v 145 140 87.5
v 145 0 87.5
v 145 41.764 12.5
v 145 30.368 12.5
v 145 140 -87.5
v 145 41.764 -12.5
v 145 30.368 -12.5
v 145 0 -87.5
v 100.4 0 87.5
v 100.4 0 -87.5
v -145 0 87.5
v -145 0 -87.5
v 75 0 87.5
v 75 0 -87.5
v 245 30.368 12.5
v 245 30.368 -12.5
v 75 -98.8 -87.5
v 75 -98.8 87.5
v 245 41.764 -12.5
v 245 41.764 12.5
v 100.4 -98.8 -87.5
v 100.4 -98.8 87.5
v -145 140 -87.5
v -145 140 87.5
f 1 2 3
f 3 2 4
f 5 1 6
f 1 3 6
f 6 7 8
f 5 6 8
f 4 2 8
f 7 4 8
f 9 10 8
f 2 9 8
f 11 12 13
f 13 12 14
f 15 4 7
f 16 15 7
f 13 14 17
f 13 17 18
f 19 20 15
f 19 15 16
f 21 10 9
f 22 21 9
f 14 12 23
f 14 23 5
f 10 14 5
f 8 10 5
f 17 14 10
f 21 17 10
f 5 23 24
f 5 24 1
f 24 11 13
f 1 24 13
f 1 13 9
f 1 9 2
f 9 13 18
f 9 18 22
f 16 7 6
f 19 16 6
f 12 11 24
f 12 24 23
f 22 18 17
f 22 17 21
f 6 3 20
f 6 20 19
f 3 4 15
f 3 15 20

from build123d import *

# Parameters (mm, degrees)
SKETCH1_W           = 290
SKETCH1_H           = 175
BOSS_EXTRUDE1_DEPTH = 140
SKETCH2_W           = 25.4
SKETCH2_H           = 175
BOSS_EXTRUDE2_DEPTH = 98.8
SKETCH3_W           = 25
SKETCH3_H           = 11.396117448
BOSS_EXTRUDE3_DEPTH = 100


with BuildPart() as part:
    # Sketch1 → Boss-Extrude1 (new body)
    with BuildSketch(Plane(origin=(0, 0, 0), x_dir=(1, 0, 0), z_dir=(0, 1, 0))):
        Rectangle(SKETCH1_W, SKETCH1_H)
    extrude(amount=BOSS_EXTRUDE1_DEPTH)

    # Sketch2 → Boss-Extrude2 (add)
    with BuildSketch(Plane.XZ):
        with Locations((87.7, 0)):
            Rectangle(SKETCH2_W, SKETCH2_H)
    extrude(amount=BOSS_EXTRUDE2_DEPTH)

    # Sketch3 → Boss-Extrude3 (add)
    with BuildSketch(Plane(origin=(145, 0, 0), x_dir=(0, 0, -1), z_dir=(1, 0, 0))):
        with Locations((0, 36.066217011)):
            Rectangle(SKETCH3_W, SKETCH3_H)
    extrude(amount=BOSS_EXTRUDE3_DEPTH)


solid = part.part
